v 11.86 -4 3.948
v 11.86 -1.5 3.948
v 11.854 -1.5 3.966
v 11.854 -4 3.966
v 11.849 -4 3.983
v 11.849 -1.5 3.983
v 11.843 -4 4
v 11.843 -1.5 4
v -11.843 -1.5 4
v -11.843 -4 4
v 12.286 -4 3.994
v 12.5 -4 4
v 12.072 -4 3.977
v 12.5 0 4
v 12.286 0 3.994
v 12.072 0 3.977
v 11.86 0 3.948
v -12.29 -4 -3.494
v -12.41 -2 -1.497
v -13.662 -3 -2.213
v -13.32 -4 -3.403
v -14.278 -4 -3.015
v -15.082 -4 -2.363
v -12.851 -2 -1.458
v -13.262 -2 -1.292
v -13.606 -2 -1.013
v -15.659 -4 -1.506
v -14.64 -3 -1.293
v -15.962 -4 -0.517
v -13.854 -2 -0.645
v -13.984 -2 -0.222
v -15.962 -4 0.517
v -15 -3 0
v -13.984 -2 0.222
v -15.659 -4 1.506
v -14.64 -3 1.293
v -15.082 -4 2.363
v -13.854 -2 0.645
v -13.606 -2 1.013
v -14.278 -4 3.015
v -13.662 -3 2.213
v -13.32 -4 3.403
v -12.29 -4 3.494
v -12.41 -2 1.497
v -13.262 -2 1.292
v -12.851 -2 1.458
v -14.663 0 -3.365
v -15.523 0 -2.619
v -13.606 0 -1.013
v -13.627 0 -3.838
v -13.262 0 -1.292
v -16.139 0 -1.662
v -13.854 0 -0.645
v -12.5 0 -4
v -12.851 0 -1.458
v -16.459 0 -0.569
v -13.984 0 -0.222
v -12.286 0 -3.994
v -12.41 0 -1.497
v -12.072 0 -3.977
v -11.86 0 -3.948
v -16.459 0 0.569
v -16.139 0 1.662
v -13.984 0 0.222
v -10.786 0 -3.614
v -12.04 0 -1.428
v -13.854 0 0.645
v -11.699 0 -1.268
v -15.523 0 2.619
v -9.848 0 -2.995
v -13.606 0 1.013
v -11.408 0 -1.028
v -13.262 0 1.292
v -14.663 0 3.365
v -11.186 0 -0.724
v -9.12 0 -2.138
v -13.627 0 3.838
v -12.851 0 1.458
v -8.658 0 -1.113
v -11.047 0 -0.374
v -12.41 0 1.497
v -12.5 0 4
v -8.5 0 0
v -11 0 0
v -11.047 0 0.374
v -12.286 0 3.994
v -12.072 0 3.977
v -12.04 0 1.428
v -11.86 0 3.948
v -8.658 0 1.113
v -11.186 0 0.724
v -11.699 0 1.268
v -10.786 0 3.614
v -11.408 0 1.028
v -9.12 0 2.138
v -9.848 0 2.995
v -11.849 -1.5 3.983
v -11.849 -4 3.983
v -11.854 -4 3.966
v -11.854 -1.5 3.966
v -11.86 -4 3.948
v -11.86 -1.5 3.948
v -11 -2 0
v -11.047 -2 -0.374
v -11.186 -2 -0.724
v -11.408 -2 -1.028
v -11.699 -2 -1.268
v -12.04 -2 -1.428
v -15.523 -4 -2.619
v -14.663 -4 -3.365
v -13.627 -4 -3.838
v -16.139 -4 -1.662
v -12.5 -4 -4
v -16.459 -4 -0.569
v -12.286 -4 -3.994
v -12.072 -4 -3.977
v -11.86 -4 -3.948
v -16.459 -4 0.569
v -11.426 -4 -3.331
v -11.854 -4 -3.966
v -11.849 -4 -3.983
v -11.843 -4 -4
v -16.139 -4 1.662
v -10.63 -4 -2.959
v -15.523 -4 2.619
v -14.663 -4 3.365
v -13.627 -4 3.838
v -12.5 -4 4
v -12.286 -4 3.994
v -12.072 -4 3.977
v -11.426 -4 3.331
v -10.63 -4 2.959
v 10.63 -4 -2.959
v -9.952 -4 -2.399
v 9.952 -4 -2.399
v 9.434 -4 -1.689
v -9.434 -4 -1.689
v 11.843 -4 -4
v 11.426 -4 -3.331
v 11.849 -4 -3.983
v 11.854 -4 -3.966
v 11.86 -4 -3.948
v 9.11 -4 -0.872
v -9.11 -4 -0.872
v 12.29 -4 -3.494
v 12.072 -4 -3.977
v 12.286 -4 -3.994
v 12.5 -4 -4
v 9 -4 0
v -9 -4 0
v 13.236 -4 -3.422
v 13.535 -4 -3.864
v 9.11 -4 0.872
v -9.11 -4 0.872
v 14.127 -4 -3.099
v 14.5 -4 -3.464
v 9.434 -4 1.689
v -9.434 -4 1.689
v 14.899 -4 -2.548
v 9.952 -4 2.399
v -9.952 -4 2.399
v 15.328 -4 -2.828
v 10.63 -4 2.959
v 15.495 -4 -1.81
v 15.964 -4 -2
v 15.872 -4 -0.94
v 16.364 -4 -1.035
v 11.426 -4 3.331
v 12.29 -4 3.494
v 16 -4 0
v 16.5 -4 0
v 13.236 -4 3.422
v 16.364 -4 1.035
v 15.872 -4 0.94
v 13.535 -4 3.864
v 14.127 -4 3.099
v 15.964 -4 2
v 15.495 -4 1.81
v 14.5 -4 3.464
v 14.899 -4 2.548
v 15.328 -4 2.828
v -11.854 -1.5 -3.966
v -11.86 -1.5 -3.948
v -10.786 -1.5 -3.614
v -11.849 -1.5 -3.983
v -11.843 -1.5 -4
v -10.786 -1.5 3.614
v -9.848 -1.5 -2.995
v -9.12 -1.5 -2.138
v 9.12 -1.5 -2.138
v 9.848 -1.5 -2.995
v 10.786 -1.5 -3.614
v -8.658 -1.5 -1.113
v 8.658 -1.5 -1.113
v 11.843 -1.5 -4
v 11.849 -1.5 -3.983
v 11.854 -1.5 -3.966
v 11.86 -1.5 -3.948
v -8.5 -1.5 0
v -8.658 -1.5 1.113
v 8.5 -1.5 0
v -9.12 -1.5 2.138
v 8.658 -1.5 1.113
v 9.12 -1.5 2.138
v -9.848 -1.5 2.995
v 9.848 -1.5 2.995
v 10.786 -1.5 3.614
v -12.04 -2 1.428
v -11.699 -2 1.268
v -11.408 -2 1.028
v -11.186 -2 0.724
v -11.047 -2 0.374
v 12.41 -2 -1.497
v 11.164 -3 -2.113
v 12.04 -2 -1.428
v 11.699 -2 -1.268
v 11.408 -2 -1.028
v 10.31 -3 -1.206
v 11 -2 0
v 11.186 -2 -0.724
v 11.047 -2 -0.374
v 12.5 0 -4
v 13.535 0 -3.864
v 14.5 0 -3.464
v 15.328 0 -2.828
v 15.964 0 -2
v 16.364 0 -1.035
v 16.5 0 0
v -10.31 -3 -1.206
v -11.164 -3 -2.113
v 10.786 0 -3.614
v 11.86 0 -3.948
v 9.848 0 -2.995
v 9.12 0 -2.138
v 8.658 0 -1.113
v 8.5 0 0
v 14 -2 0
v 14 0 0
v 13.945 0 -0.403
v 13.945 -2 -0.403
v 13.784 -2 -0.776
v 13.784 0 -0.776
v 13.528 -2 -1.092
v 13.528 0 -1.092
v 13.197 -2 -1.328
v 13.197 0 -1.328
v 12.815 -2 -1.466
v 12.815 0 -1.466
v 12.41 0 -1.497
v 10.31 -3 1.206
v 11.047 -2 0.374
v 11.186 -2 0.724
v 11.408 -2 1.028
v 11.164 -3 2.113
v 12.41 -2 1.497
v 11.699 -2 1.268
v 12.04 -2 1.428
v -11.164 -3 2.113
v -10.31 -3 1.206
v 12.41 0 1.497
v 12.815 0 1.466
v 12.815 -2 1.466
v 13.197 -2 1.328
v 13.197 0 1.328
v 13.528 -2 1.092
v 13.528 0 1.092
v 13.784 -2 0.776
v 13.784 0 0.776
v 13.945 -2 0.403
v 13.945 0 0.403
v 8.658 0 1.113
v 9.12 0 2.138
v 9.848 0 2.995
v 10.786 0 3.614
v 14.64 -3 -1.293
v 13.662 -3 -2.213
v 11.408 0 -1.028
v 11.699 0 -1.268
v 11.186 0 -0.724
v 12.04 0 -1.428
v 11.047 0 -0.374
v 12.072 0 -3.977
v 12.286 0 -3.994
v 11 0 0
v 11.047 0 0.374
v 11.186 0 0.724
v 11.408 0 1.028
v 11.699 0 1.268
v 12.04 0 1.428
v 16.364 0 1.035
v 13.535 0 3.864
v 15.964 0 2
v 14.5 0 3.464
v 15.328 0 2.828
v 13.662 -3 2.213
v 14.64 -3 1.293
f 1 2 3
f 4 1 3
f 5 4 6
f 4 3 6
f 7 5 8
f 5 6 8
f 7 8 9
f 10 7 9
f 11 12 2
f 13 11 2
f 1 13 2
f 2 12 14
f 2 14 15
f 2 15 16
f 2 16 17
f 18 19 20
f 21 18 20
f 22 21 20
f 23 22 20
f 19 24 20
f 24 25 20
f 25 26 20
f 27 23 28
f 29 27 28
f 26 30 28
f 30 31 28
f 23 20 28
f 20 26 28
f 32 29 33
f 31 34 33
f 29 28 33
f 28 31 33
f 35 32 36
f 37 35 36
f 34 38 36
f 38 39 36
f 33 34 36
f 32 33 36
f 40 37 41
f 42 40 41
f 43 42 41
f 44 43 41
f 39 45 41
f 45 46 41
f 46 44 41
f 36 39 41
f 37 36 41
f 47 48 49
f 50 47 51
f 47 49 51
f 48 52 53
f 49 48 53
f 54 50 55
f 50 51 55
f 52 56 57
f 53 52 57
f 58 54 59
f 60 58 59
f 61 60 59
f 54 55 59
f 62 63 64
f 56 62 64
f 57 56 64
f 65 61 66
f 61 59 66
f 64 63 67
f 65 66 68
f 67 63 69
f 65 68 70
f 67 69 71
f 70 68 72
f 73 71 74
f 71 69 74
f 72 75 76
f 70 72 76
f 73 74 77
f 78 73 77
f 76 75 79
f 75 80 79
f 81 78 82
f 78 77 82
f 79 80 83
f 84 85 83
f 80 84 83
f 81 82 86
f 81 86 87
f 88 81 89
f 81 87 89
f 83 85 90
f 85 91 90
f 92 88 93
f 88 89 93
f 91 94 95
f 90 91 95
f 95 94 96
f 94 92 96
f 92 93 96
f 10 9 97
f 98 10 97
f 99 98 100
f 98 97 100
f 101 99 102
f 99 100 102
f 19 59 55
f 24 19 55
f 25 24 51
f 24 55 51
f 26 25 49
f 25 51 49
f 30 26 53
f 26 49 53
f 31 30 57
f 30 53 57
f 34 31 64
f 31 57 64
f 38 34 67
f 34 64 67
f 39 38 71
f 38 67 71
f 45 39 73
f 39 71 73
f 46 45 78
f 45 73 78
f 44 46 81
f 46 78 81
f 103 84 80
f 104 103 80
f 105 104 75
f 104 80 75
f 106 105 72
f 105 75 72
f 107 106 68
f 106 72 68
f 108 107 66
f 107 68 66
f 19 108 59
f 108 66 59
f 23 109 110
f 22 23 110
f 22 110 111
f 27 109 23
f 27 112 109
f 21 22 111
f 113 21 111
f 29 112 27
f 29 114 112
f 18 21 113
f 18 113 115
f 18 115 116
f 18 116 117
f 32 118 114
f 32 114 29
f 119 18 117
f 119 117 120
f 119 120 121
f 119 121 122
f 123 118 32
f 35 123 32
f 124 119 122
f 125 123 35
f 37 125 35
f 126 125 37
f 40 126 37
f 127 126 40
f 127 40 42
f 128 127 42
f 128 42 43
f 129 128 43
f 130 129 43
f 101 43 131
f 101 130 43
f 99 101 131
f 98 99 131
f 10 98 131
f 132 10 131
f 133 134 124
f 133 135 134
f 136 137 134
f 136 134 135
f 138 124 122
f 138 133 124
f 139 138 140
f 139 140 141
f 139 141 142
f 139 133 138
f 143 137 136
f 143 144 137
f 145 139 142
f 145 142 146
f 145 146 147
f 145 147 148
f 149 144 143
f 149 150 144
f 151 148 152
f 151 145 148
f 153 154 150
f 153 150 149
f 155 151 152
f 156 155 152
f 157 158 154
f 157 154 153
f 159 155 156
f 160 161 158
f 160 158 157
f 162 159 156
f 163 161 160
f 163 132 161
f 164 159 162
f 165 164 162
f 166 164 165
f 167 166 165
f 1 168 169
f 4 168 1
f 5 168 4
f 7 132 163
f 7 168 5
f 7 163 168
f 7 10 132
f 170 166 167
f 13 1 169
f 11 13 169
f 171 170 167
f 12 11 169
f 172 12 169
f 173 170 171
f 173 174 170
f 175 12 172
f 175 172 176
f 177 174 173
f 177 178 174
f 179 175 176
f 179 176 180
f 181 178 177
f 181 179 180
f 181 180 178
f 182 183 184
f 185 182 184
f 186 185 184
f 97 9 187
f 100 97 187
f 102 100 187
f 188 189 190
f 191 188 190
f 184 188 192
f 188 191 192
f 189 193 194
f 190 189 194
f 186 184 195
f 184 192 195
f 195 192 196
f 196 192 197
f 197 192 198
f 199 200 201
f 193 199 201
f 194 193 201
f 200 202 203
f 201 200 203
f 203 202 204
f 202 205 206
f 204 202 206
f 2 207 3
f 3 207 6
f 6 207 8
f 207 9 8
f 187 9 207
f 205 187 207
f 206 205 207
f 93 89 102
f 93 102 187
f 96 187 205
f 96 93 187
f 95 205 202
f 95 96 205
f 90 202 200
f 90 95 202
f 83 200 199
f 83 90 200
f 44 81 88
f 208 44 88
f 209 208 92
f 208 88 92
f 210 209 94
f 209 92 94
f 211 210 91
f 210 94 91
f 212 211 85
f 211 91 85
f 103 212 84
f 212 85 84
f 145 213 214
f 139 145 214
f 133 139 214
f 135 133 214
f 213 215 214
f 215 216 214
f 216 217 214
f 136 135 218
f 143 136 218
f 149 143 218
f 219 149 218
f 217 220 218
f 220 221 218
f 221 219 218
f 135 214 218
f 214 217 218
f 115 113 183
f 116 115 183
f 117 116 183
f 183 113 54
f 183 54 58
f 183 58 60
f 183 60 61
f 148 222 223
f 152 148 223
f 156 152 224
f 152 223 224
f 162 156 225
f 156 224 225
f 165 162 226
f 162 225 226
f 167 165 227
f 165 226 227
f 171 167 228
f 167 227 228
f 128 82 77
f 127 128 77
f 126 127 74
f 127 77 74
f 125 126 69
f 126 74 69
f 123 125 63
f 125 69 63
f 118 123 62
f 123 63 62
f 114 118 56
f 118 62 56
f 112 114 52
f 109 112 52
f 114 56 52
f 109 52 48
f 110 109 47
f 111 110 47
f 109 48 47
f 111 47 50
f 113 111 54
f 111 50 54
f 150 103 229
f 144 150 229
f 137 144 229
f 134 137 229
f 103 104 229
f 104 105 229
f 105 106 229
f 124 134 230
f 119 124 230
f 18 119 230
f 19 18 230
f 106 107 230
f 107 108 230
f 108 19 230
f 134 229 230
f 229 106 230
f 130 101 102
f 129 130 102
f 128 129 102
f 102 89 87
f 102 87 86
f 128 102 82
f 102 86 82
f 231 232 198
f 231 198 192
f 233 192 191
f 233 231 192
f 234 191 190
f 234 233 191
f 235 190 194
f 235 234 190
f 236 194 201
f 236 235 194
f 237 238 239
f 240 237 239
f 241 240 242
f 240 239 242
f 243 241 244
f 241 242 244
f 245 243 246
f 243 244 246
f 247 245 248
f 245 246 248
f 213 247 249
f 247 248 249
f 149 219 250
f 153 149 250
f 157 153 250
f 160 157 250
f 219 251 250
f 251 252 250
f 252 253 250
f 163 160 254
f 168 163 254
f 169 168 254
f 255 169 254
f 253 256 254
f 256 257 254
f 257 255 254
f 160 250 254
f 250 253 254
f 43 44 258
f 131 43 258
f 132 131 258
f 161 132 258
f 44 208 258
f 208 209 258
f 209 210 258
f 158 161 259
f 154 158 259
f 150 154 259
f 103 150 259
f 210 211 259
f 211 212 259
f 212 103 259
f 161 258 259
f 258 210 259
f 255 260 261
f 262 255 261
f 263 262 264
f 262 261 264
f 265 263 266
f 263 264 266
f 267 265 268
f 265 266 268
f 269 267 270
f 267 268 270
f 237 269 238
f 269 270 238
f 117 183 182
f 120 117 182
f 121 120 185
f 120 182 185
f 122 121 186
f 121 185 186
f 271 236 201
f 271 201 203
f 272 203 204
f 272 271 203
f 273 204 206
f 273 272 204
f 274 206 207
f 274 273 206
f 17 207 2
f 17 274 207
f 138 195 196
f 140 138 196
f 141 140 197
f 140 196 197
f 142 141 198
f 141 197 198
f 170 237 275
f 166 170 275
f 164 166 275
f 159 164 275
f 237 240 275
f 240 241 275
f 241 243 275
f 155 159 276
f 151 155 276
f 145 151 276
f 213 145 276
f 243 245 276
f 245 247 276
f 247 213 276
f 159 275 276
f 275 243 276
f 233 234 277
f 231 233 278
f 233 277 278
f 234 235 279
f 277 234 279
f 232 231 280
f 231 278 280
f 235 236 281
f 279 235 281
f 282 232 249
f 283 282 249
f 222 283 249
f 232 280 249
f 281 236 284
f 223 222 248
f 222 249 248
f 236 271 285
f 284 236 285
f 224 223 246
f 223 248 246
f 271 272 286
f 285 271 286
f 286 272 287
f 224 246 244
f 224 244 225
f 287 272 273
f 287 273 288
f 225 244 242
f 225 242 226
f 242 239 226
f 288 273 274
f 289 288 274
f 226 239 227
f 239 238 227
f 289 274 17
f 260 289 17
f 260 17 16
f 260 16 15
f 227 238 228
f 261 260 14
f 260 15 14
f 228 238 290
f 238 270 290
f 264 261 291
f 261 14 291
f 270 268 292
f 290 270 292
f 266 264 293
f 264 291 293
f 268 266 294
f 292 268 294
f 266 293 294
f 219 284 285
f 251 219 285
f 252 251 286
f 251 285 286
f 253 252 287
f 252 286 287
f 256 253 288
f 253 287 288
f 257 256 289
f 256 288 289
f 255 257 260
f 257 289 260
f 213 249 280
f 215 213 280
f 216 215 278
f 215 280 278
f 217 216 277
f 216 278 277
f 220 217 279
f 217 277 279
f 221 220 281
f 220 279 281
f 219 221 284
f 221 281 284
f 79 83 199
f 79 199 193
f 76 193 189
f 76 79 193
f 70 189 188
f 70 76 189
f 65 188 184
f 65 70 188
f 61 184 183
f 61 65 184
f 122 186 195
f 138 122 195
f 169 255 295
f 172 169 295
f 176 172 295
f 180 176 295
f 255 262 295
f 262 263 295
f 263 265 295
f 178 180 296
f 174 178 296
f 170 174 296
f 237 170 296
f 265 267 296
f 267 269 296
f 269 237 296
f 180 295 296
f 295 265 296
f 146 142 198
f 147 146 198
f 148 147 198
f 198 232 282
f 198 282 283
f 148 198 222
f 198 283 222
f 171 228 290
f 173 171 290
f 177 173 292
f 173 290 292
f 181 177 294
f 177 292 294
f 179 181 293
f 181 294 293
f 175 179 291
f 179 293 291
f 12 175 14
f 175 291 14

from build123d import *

# Parameters (mm, degrees)
F1_DEPTH = 4
F2_DEPTH = 1.5
F3_SIZE  = 2


with BuildPart() as f1:
    # F0 (on Front) → F1 (new body)
    with BuildSketch(Plane.XZ):
        with BuildLine():
            ThreePointArc((-12.41, 1.4972975656), (-12.1967325212, 2.7367345149), (-11.86, 3.9484680574))
            ThreePointArc((-11.86, 3.9484680574), (-12.1789643551, 3.9870962008), (-12.5, 4))
            ThreePointArc((-12.5, 4), (-16.5, 0), (-12.5, -4))
            ThreePointArc((-12.5, -4), (-12.1789643551, -3.9870962008), (-11.86, -3.9484680574))
            ThreePointArc((-11.86, -3.9484680574), (-12.1967325212, -2.7367345149), (-12.41, -1.4972975656))
            ThreePointArc((-12.41, -1.4972975656), (-14, 0), (-12.41, 1.4972975656))
        make_face()
        with BuildLine():
            Line((-11, 0), (-8.5, 0))
            ThreePointArc((-8.5, 0), (-9.4536907577, 2.5922962794), (-11.86, 3.9484680574))
            ThreePointArc((-11.86, 3.9484680574), (-12.1967325212, 2.7367345149), (-12.41, 1.4972975656))
            ThreePointArc((-12.41, 1.4972975656), (-11.4079835166, 1.0283481901), (-11, 0))
        make_face()
        with BuildLine():
            ThreePointArc((-11.86, -3.9484680574), (-9.4536907577, -2.5922962794), (-8.5, 0))
            Line((-8.5, 0), (-11, 0))
            ThreePointArc((-11, 0), (-11.4079835166, -1.0283481901), (-12.41, -1.4972975656))
            ThreePointArc((-12.41, -1.4972975656), (-12.1967325212, -2.7367345149), (-11.86, -3.9484680574))
        make_face()
        with BuildLine():
            ThreePointArc((11.8427192823, -4), (11.85138765, -3.9742434211), (11.86, -3.9484680574))
            ThreePointArc((11.86, -3.9484680574), (9.4536907577, -2.5922962794), (8.5, 0))
            Line((8.5, 0), (-8.5, 0))
            ThreePointArc((-8.5, 0), (-9.4536907577, -2.5922962794), (-11.86, -3.9484680574))
            ThreePointArc((-11.86, -3.9484680574), (-11.85138765, -3.9742434211), (-11.8427192823, -4))
            Line((-11.8427192823, -4), (11.8427192823, -4))
        make_face()
        with BuildLine():
            ThreePointArc((8.5, 0), (9.4536907577, 2.5922962794), (11.86, 3.9484680574))
            ThreePointArc((11.86, 3.9484680574), (11.85138765, 3.9742434211), (11.8427192823, 4))
            Line((11.8427192823, 4), (-11.8427192823, 4))
            ThreePointArc((-11.8427192823, 4), (-11.85138765, 3.9742434211), (-11.86, 3.9484680574))
            ThreePointArc((-11.86, 3.9484680574), (-9.4536907577, 2.5922962794), (-8.5, 0))
            Line((-8.5, 0), (8.5, 0))
        make_face()
        with BuildLine():
            ThreePointArc((11, 0), (11.4079835166, 1.0283481901), (12.41, 1.4972975656))
            ThreePointArc((12.41, 1.4972975656), (12.1967325212, 2.7367345149), (11.86, 3.9484680574))
            ThreePointArc((11.86, 3.9484680574), (9.4536907577, 2.5922962794), (8.5, 0))
            Line((8.5, 0), (11, 0))
        make_face()
        with BuildLine():
            ThreePointArc((11.86, -3.9484680574), (12.1967325212, -2.7367345149), (12.41, -1.4972975656))
            ThreePointArc((12.41, -1.4972975656), (11.4079835166, -1.0283481901), (11, 0))
            Line((11, 0), (8.5, 0))
            ThreePointArc((8.5, 0), (9.4536907577, -2.5922962794), (11.86, -3.9484680574))
        make_face()
        with BuildLine():
            ThreePointArc((11.86, 3.9484680574), (12.1967325212, 2.7367345149), (12.41, 1.4972975656))
            ThreePointArc((12.41, 1.4972975656), (13.5283481901, 1.0920164834), (14, 0))
            ThreePointArc((14, 0), (13.5283481901, -1.0920164834), (12.41, -1.4972975656))
            ThreePointArc((12.41, -1.4972975656), (12.1967325212, -2.7367345149), (11.86, -3.9484680574))
            ThreePointArc((11.86, -3.9484680574), (12.1789643551, -3.9870962008), (12.5, -4))
            ThreePointArc((12.5, -4), (15.3284271247, -2.8284271247), (16.5, 0))
            ThreePointArc((16.5, 0), (15.3284271247, 2.8284271247), (12.5, 4))
            ThreePointArc((12.5, 4), (12.1789643551, 3.9870962008), (11.86, 3.9484680574))
        make_face()
    extrude(amount=F1_DEPTH)

    # F0 (on Front) → F2 (cut)
    with BuildSketch(Plane.XZ):
        with BuildLine():
            ThreePointArc((11.8427192823, -4), (11.85138765, -3.9742434211), (11.86, -3.9484680574))
            ThreePointArc((11.86, -3.9484680574), (9.4536907577, -2.5922962794), (8.5, 0))
            Line((8.5, 0), (-8.5, 0))
            ThreePointArc((-8.5, 0), (-9.4536907577, -2.5922962794), (-11.86, -3.9484680574))
            ThreePointArc((-11.86, -3.9484680574), (-11.85138765, -3.9742434211), (-11.8427192823, -4))
            Line((-11.8427192823, -4), (11.8427192823, -4))
        make_face()
        with BuildLine():
            ThreePointArc((8.5, 0), (9.4536907577, 2.5922962794), (11.86, 3.9484680574))
            ThreePointArc((11.86, 3.9484680574), (11.85138765, 3.9742434211), (11.8427192823, 4))
            Line((11.8427192823, 4), (-11.8427192823, 4))
            ThreePointArc((-11.8427192823, 4), (-11.85138765, 3.9742434211), (-11.86, 3.9484680574))
            ThreePointArc((-11.86, 3.9484680574), (-9.4536907577, 2.5922962794), (-8.5, 0))
            Line((-8.5, 0), (8.5, 0))
        make_face()
    extrude(amount=F2_DEPTH, mode=Mode.SUBTRACT)

    # F3
    f3_edges = [f1.edges().sort_by_distance(p)[0] for p in [
        (-14, -4, 0),
        (12.59, -4, -1.497298),
    ]]
    chamfer(f3_edges, length=F3_SIZE)


solid = f1.part
